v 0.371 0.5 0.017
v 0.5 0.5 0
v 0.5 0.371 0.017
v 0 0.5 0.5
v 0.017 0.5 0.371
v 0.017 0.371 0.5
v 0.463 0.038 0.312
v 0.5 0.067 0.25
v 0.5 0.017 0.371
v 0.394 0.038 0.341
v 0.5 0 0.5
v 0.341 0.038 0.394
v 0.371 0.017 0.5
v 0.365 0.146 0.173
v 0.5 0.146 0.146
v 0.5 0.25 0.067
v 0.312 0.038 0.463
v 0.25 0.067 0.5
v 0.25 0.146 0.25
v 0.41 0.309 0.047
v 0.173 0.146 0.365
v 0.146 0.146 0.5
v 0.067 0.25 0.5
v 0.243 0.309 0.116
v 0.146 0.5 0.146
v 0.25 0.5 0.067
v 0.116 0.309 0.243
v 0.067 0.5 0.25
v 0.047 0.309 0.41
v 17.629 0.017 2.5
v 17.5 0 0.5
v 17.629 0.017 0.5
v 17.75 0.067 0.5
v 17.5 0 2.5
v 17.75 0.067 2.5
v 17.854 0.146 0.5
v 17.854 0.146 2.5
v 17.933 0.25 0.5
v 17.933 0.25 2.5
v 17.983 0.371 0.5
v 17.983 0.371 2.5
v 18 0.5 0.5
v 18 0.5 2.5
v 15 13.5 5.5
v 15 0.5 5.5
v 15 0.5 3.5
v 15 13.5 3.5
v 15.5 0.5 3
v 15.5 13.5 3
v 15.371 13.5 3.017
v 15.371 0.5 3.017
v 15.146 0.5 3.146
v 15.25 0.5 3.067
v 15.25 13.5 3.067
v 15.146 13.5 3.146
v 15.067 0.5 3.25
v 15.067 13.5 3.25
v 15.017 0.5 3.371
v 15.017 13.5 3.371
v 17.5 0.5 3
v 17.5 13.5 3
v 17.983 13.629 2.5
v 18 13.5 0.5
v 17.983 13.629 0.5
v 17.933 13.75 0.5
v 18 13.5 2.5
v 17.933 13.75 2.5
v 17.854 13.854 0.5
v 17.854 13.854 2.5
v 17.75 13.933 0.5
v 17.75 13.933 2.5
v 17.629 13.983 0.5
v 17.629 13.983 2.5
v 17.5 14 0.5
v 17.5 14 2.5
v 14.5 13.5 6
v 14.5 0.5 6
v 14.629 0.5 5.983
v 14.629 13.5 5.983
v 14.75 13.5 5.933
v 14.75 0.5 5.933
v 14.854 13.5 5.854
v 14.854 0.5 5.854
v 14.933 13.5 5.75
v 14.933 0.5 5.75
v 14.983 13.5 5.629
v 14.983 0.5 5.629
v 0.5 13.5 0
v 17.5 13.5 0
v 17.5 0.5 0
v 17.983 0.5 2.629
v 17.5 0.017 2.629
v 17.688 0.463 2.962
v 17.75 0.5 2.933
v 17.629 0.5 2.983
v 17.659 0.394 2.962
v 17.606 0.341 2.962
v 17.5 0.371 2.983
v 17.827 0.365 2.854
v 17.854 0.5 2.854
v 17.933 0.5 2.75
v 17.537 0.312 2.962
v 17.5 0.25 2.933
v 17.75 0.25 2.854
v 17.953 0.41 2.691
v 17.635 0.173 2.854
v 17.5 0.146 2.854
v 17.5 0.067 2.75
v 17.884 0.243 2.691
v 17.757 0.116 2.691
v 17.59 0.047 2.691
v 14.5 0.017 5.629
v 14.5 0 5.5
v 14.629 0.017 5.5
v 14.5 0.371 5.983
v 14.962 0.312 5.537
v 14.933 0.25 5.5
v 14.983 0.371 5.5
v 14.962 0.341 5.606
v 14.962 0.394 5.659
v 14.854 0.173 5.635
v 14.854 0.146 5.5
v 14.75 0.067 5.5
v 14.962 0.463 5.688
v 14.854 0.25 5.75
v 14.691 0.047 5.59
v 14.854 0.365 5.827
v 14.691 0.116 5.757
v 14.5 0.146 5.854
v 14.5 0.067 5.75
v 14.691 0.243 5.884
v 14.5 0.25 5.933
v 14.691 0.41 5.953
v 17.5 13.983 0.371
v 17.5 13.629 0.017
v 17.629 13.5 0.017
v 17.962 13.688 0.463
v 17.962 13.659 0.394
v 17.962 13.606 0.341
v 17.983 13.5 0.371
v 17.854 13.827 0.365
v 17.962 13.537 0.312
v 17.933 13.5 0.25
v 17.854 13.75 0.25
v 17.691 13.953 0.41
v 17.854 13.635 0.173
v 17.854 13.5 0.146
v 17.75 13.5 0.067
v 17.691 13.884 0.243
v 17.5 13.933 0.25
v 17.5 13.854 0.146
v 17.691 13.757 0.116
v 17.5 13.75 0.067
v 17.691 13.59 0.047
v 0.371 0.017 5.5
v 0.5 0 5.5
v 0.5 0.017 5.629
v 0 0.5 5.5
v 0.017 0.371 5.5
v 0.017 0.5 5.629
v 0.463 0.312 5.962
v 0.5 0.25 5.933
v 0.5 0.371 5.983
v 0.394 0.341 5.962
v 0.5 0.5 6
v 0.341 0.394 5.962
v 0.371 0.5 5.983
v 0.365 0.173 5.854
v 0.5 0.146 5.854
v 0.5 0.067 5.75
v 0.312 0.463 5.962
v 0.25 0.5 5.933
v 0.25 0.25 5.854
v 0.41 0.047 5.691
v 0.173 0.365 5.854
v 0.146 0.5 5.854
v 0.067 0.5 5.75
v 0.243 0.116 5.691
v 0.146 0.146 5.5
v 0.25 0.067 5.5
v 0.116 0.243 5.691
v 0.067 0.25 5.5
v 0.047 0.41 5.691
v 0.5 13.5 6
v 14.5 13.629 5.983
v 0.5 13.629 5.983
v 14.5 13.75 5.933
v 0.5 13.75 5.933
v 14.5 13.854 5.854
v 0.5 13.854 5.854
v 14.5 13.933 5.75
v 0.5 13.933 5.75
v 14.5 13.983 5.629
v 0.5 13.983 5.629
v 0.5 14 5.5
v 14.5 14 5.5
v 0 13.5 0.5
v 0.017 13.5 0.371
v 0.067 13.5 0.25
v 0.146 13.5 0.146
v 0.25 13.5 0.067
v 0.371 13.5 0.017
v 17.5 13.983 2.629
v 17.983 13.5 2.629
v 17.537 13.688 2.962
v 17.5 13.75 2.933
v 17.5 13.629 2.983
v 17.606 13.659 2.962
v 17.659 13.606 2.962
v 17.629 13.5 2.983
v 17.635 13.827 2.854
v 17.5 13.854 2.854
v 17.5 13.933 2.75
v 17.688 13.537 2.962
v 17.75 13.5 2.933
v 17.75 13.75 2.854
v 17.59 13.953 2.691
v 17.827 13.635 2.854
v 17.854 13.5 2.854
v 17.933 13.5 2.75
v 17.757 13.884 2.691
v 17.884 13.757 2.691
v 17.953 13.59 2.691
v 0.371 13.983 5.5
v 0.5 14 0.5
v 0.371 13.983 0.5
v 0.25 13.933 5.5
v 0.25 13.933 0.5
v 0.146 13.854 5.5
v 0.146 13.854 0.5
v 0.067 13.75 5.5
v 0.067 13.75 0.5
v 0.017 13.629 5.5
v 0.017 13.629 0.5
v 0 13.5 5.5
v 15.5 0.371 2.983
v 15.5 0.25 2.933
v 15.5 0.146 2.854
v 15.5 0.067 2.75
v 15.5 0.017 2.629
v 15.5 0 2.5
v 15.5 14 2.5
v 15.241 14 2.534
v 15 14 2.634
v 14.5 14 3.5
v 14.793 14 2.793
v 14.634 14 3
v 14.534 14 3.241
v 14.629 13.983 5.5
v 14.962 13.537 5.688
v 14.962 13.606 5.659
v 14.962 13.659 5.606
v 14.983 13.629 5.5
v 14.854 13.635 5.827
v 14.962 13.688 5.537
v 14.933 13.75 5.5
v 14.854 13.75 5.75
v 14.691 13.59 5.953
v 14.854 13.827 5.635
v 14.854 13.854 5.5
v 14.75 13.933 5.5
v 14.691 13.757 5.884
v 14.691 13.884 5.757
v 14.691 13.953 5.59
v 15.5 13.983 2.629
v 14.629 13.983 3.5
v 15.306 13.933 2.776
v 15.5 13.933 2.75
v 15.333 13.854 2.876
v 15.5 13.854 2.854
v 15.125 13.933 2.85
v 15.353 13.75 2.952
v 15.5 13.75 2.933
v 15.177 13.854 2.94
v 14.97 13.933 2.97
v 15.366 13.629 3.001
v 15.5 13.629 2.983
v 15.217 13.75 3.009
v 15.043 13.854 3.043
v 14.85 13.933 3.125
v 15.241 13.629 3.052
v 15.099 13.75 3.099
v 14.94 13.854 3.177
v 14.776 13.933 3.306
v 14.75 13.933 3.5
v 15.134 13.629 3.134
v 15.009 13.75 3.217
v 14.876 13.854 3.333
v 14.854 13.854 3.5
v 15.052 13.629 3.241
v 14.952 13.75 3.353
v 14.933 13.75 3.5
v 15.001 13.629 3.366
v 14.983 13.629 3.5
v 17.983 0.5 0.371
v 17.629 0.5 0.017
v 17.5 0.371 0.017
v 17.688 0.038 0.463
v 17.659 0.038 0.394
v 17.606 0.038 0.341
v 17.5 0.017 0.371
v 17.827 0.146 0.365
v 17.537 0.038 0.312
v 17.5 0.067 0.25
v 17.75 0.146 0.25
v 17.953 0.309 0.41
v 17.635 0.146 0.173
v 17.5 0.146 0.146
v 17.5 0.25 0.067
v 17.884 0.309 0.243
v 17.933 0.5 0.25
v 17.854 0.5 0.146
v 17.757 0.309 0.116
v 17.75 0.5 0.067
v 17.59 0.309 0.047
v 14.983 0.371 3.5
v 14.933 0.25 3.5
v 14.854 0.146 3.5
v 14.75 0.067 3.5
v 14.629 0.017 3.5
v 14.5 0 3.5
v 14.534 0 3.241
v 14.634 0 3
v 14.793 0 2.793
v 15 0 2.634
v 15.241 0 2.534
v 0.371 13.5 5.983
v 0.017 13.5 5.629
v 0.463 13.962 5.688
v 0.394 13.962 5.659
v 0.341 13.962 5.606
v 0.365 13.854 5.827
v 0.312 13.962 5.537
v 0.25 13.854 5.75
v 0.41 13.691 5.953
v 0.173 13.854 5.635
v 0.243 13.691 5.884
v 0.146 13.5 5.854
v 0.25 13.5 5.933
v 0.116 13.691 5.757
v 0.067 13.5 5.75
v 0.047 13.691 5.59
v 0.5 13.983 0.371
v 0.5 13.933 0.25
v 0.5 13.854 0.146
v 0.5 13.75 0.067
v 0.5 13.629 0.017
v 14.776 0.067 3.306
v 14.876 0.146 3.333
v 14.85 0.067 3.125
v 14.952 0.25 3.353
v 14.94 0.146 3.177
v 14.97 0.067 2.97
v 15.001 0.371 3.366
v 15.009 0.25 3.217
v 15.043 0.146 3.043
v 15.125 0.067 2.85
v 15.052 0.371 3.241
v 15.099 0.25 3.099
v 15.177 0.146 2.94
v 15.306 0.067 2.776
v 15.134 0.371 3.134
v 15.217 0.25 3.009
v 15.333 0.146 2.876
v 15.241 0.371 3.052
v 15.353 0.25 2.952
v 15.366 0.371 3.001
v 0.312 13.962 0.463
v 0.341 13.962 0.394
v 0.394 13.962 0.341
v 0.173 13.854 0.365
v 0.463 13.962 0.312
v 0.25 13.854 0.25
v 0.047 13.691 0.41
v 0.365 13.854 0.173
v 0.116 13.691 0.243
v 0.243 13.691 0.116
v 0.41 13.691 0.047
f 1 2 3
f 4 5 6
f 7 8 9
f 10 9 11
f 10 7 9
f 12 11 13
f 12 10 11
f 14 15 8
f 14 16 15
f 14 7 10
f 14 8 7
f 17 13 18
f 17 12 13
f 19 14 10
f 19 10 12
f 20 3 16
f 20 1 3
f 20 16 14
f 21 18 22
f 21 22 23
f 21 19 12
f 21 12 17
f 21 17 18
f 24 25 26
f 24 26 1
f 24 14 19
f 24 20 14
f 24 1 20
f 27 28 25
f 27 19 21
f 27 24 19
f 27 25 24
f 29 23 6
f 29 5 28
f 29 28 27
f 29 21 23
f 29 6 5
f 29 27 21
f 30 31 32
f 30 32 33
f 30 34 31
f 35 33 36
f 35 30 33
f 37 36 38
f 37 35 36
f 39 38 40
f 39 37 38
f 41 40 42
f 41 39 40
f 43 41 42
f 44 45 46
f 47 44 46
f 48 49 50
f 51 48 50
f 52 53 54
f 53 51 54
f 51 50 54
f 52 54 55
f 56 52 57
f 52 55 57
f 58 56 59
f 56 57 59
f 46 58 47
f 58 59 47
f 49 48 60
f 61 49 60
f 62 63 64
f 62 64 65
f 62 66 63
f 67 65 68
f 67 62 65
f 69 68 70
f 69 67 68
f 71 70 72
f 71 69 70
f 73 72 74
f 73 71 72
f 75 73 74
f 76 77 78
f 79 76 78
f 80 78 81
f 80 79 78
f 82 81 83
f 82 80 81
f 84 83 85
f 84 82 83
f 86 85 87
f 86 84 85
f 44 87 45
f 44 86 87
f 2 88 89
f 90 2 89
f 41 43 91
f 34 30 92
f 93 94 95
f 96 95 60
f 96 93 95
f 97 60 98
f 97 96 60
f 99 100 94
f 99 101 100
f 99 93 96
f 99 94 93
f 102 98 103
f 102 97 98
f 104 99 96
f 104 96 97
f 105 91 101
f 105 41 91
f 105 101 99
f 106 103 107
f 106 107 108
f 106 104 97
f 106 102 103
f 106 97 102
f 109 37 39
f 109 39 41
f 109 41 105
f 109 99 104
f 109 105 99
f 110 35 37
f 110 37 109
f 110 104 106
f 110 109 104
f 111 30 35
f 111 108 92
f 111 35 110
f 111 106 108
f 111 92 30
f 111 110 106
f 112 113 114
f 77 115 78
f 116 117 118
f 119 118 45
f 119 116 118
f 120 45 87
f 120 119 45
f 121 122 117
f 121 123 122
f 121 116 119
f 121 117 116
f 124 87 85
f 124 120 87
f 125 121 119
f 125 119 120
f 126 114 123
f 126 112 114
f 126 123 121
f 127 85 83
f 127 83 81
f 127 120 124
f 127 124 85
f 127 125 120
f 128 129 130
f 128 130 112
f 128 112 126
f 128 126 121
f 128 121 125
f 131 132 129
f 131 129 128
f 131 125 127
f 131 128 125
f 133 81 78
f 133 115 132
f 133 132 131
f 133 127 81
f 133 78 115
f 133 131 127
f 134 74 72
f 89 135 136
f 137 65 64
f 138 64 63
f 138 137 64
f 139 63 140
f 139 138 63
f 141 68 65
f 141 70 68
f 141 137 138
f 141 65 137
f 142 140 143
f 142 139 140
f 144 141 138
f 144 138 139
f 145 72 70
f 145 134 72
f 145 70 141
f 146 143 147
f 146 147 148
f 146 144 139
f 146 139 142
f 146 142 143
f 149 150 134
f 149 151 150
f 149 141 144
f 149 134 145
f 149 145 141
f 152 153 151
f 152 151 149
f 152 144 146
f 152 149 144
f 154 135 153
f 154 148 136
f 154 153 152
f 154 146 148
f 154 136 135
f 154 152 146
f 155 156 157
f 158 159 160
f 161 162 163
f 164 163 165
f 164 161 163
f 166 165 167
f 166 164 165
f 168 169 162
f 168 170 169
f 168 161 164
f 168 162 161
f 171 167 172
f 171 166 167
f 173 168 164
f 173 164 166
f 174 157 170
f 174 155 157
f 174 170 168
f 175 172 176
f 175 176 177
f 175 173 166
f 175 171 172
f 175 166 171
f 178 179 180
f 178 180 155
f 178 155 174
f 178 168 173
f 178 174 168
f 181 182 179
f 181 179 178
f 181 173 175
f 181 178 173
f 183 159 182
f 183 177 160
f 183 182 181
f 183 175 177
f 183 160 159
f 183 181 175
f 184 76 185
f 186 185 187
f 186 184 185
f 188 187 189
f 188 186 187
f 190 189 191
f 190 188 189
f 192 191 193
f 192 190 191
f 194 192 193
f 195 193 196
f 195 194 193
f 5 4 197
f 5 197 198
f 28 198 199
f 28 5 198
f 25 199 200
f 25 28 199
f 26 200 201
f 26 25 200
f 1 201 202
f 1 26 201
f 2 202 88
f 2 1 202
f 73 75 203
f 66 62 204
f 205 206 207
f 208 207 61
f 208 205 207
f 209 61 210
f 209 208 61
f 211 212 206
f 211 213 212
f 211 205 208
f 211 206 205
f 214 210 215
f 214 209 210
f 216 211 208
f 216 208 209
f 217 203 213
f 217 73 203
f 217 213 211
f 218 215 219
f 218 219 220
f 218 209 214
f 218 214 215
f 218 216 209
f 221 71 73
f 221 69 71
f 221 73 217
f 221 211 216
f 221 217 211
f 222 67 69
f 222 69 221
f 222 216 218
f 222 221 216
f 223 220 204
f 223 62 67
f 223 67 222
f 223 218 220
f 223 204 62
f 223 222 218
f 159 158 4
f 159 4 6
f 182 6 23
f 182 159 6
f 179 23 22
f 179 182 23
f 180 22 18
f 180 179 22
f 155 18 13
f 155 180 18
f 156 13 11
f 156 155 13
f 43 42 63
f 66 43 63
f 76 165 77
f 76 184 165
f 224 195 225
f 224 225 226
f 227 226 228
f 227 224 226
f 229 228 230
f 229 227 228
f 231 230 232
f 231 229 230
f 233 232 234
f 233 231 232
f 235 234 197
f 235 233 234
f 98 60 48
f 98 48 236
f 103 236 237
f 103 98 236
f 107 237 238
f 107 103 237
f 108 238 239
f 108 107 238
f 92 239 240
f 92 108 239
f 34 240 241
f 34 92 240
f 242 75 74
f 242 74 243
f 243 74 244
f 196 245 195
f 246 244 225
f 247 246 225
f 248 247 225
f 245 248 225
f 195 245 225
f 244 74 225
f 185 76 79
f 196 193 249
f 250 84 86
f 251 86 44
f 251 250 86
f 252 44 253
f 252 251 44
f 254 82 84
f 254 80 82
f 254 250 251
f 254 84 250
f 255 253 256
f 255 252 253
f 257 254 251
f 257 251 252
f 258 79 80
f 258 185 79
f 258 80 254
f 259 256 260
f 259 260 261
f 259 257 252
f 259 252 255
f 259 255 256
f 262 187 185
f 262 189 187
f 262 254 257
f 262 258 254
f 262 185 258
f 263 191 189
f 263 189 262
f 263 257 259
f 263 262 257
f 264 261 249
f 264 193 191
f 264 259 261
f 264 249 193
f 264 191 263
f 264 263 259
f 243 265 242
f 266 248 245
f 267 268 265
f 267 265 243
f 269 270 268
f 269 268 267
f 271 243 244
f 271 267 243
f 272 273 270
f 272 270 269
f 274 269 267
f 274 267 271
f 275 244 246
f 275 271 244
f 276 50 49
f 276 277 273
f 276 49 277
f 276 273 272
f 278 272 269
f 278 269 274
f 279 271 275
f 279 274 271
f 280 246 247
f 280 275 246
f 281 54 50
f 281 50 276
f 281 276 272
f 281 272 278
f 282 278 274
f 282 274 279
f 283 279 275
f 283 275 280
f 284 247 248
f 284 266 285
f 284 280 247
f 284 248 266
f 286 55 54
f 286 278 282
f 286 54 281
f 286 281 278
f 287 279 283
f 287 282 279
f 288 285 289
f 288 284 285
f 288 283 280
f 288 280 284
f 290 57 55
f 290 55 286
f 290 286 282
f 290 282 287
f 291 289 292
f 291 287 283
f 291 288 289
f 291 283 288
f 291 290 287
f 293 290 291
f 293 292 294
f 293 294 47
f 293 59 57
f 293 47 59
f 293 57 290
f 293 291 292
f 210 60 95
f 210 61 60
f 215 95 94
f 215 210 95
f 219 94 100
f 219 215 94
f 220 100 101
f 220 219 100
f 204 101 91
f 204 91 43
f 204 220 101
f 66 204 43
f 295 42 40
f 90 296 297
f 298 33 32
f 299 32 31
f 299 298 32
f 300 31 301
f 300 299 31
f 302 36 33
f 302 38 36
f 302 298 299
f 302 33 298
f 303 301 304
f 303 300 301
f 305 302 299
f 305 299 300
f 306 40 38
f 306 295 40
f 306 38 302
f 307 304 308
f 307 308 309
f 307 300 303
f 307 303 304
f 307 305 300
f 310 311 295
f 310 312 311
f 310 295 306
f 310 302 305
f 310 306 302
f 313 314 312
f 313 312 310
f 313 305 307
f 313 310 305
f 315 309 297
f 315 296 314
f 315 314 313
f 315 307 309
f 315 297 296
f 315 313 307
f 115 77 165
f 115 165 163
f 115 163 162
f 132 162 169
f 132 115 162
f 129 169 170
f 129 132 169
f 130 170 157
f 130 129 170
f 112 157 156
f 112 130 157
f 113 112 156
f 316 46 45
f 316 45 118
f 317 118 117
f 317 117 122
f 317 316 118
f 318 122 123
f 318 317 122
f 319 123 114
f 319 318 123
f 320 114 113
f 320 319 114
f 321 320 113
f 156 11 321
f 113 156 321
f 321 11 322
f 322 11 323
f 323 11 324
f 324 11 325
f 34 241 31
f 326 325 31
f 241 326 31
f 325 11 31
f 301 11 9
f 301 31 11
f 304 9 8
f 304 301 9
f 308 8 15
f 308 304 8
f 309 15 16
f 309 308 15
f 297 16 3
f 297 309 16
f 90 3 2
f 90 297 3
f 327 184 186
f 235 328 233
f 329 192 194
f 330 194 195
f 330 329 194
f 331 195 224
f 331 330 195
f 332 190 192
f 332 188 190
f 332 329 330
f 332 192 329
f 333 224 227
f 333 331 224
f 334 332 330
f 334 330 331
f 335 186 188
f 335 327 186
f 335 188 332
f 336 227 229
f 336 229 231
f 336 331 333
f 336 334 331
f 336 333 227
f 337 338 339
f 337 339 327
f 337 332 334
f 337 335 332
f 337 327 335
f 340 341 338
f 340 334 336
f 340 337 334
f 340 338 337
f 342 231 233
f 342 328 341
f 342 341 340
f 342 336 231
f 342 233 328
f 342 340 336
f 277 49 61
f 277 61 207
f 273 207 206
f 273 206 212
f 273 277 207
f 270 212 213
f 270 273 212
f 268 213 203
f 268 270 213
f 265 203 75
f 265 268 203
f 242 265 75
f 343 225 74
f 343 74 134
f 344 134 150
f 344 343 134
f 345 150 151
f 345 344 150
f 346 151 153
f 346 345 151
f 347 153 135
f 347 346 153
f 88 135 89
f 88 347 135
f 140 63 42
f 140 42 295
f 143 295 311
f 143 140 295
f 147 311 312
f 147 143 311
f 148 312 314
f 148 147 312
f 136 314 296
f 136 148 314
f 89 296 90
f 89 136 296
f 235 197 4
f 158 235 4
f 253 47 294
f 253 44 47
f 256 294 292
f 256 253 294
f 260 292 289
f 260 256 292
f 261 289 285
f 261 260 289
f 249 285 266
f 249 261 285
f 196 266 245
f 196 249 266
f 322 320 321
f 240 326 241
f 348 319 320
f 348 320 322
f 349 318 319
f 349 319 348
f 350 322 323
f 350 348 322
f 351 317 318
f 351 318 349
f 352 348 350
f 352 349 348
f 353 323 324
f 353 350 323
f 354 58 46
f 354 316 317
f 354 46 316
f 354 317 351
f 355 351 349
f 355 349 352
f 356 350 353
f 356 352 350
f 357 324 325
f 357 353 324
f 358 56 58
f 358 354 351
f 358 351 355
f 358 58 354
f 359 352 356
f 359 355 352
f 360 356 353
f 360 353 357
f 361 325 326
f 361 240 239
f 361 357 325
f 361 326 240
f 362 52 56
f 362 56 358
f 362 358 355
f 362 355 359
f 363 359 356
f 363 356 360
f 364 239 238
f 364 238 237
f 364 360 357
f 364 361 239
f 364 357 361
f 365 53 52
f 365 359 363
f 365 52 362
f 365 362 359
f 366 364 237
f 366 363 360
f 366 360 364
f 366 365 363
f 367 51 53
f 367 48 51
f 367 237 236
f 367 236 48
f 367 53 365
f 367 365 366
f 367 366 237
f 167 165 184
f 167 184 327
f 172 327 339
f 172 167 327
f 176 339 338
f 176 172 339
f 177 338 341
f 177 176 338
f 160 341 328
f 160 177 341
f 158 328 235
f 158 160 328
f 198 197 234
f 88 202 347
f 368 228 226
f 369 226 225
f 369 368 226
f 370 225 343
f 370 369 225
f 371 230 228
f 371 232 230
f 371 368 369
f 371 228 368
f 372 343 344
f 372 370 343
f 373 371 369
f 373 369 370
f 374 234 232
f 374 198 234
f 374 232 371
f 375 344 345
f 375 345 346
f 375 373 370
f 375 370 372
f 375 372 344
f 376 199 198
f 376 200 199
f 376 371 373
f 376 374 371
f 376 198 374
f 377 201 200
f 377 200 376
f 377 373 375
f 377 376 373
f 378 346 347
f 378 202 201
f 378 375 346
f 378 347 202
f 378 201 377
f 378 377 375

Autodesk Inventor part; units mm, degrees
ref_plane "YZ Plane" through (0, 0, 0) normal (1, 0, 0) x (0, 1, 0)
ref_plane "XZ Plane" through (0, 0, 0) normal (0, 1, 0) x (-1, 0, 0)
ref_plane "XY Plane" through (0, 0, 0) normal (0, 0, 1) x (1, 0, 0)
sketch "Sketch1" plane through (0, 0, 0) normal (0, 0, 1) x (1, 0, 0)
  line L0 (0, 0) -> (18, 0)
  line L1 (18, 0) -> (18, 14)
  line L2 (18, 14) -> (0, 14)
  line L3 (0, 14) -> (0, 0)
  dimension "d0" = 18
  dimension "d1" = 14
extrude "Extrusion1" add sketch "Sketch1" along normal blind 6
sketch "Sketch2" plane through (0, 0, 0) normal (0, -1, 0) x (1, 0, 0)
  line L0 (18, 6) -> (15, 6)
  line L1 (15, 6) -> (15, 3)
  line L2 (15, 3) -> (18, 3)
  line L3 (18, 3) -> (18, 6)
  point P0 (0, 0)
  dimension "d5" = 3
  dimension "d6" = 3
extrude "Extrusion2" cut sketch "Sketch2" against normal up to next
fillet "Fillet1" radius 0.5 18 edges at (0, 7, 0) (0, 0, 3) (0, 7, 6) (0, 14, 3) (9, 14, 0) (7.5, 14, 6) (18, 14, 1.5) (18, 7, 0) (18, 0, 1.5) (9, 0, 0) (7.5, 0, 6) (15, 7, 3) (15, 7, 6) (15, 0, 4.5) (16.5, 0, 3) (16.5, 14, 3) (18, 7, 3) (15, 14, 4.5)
properties part number "battery"
